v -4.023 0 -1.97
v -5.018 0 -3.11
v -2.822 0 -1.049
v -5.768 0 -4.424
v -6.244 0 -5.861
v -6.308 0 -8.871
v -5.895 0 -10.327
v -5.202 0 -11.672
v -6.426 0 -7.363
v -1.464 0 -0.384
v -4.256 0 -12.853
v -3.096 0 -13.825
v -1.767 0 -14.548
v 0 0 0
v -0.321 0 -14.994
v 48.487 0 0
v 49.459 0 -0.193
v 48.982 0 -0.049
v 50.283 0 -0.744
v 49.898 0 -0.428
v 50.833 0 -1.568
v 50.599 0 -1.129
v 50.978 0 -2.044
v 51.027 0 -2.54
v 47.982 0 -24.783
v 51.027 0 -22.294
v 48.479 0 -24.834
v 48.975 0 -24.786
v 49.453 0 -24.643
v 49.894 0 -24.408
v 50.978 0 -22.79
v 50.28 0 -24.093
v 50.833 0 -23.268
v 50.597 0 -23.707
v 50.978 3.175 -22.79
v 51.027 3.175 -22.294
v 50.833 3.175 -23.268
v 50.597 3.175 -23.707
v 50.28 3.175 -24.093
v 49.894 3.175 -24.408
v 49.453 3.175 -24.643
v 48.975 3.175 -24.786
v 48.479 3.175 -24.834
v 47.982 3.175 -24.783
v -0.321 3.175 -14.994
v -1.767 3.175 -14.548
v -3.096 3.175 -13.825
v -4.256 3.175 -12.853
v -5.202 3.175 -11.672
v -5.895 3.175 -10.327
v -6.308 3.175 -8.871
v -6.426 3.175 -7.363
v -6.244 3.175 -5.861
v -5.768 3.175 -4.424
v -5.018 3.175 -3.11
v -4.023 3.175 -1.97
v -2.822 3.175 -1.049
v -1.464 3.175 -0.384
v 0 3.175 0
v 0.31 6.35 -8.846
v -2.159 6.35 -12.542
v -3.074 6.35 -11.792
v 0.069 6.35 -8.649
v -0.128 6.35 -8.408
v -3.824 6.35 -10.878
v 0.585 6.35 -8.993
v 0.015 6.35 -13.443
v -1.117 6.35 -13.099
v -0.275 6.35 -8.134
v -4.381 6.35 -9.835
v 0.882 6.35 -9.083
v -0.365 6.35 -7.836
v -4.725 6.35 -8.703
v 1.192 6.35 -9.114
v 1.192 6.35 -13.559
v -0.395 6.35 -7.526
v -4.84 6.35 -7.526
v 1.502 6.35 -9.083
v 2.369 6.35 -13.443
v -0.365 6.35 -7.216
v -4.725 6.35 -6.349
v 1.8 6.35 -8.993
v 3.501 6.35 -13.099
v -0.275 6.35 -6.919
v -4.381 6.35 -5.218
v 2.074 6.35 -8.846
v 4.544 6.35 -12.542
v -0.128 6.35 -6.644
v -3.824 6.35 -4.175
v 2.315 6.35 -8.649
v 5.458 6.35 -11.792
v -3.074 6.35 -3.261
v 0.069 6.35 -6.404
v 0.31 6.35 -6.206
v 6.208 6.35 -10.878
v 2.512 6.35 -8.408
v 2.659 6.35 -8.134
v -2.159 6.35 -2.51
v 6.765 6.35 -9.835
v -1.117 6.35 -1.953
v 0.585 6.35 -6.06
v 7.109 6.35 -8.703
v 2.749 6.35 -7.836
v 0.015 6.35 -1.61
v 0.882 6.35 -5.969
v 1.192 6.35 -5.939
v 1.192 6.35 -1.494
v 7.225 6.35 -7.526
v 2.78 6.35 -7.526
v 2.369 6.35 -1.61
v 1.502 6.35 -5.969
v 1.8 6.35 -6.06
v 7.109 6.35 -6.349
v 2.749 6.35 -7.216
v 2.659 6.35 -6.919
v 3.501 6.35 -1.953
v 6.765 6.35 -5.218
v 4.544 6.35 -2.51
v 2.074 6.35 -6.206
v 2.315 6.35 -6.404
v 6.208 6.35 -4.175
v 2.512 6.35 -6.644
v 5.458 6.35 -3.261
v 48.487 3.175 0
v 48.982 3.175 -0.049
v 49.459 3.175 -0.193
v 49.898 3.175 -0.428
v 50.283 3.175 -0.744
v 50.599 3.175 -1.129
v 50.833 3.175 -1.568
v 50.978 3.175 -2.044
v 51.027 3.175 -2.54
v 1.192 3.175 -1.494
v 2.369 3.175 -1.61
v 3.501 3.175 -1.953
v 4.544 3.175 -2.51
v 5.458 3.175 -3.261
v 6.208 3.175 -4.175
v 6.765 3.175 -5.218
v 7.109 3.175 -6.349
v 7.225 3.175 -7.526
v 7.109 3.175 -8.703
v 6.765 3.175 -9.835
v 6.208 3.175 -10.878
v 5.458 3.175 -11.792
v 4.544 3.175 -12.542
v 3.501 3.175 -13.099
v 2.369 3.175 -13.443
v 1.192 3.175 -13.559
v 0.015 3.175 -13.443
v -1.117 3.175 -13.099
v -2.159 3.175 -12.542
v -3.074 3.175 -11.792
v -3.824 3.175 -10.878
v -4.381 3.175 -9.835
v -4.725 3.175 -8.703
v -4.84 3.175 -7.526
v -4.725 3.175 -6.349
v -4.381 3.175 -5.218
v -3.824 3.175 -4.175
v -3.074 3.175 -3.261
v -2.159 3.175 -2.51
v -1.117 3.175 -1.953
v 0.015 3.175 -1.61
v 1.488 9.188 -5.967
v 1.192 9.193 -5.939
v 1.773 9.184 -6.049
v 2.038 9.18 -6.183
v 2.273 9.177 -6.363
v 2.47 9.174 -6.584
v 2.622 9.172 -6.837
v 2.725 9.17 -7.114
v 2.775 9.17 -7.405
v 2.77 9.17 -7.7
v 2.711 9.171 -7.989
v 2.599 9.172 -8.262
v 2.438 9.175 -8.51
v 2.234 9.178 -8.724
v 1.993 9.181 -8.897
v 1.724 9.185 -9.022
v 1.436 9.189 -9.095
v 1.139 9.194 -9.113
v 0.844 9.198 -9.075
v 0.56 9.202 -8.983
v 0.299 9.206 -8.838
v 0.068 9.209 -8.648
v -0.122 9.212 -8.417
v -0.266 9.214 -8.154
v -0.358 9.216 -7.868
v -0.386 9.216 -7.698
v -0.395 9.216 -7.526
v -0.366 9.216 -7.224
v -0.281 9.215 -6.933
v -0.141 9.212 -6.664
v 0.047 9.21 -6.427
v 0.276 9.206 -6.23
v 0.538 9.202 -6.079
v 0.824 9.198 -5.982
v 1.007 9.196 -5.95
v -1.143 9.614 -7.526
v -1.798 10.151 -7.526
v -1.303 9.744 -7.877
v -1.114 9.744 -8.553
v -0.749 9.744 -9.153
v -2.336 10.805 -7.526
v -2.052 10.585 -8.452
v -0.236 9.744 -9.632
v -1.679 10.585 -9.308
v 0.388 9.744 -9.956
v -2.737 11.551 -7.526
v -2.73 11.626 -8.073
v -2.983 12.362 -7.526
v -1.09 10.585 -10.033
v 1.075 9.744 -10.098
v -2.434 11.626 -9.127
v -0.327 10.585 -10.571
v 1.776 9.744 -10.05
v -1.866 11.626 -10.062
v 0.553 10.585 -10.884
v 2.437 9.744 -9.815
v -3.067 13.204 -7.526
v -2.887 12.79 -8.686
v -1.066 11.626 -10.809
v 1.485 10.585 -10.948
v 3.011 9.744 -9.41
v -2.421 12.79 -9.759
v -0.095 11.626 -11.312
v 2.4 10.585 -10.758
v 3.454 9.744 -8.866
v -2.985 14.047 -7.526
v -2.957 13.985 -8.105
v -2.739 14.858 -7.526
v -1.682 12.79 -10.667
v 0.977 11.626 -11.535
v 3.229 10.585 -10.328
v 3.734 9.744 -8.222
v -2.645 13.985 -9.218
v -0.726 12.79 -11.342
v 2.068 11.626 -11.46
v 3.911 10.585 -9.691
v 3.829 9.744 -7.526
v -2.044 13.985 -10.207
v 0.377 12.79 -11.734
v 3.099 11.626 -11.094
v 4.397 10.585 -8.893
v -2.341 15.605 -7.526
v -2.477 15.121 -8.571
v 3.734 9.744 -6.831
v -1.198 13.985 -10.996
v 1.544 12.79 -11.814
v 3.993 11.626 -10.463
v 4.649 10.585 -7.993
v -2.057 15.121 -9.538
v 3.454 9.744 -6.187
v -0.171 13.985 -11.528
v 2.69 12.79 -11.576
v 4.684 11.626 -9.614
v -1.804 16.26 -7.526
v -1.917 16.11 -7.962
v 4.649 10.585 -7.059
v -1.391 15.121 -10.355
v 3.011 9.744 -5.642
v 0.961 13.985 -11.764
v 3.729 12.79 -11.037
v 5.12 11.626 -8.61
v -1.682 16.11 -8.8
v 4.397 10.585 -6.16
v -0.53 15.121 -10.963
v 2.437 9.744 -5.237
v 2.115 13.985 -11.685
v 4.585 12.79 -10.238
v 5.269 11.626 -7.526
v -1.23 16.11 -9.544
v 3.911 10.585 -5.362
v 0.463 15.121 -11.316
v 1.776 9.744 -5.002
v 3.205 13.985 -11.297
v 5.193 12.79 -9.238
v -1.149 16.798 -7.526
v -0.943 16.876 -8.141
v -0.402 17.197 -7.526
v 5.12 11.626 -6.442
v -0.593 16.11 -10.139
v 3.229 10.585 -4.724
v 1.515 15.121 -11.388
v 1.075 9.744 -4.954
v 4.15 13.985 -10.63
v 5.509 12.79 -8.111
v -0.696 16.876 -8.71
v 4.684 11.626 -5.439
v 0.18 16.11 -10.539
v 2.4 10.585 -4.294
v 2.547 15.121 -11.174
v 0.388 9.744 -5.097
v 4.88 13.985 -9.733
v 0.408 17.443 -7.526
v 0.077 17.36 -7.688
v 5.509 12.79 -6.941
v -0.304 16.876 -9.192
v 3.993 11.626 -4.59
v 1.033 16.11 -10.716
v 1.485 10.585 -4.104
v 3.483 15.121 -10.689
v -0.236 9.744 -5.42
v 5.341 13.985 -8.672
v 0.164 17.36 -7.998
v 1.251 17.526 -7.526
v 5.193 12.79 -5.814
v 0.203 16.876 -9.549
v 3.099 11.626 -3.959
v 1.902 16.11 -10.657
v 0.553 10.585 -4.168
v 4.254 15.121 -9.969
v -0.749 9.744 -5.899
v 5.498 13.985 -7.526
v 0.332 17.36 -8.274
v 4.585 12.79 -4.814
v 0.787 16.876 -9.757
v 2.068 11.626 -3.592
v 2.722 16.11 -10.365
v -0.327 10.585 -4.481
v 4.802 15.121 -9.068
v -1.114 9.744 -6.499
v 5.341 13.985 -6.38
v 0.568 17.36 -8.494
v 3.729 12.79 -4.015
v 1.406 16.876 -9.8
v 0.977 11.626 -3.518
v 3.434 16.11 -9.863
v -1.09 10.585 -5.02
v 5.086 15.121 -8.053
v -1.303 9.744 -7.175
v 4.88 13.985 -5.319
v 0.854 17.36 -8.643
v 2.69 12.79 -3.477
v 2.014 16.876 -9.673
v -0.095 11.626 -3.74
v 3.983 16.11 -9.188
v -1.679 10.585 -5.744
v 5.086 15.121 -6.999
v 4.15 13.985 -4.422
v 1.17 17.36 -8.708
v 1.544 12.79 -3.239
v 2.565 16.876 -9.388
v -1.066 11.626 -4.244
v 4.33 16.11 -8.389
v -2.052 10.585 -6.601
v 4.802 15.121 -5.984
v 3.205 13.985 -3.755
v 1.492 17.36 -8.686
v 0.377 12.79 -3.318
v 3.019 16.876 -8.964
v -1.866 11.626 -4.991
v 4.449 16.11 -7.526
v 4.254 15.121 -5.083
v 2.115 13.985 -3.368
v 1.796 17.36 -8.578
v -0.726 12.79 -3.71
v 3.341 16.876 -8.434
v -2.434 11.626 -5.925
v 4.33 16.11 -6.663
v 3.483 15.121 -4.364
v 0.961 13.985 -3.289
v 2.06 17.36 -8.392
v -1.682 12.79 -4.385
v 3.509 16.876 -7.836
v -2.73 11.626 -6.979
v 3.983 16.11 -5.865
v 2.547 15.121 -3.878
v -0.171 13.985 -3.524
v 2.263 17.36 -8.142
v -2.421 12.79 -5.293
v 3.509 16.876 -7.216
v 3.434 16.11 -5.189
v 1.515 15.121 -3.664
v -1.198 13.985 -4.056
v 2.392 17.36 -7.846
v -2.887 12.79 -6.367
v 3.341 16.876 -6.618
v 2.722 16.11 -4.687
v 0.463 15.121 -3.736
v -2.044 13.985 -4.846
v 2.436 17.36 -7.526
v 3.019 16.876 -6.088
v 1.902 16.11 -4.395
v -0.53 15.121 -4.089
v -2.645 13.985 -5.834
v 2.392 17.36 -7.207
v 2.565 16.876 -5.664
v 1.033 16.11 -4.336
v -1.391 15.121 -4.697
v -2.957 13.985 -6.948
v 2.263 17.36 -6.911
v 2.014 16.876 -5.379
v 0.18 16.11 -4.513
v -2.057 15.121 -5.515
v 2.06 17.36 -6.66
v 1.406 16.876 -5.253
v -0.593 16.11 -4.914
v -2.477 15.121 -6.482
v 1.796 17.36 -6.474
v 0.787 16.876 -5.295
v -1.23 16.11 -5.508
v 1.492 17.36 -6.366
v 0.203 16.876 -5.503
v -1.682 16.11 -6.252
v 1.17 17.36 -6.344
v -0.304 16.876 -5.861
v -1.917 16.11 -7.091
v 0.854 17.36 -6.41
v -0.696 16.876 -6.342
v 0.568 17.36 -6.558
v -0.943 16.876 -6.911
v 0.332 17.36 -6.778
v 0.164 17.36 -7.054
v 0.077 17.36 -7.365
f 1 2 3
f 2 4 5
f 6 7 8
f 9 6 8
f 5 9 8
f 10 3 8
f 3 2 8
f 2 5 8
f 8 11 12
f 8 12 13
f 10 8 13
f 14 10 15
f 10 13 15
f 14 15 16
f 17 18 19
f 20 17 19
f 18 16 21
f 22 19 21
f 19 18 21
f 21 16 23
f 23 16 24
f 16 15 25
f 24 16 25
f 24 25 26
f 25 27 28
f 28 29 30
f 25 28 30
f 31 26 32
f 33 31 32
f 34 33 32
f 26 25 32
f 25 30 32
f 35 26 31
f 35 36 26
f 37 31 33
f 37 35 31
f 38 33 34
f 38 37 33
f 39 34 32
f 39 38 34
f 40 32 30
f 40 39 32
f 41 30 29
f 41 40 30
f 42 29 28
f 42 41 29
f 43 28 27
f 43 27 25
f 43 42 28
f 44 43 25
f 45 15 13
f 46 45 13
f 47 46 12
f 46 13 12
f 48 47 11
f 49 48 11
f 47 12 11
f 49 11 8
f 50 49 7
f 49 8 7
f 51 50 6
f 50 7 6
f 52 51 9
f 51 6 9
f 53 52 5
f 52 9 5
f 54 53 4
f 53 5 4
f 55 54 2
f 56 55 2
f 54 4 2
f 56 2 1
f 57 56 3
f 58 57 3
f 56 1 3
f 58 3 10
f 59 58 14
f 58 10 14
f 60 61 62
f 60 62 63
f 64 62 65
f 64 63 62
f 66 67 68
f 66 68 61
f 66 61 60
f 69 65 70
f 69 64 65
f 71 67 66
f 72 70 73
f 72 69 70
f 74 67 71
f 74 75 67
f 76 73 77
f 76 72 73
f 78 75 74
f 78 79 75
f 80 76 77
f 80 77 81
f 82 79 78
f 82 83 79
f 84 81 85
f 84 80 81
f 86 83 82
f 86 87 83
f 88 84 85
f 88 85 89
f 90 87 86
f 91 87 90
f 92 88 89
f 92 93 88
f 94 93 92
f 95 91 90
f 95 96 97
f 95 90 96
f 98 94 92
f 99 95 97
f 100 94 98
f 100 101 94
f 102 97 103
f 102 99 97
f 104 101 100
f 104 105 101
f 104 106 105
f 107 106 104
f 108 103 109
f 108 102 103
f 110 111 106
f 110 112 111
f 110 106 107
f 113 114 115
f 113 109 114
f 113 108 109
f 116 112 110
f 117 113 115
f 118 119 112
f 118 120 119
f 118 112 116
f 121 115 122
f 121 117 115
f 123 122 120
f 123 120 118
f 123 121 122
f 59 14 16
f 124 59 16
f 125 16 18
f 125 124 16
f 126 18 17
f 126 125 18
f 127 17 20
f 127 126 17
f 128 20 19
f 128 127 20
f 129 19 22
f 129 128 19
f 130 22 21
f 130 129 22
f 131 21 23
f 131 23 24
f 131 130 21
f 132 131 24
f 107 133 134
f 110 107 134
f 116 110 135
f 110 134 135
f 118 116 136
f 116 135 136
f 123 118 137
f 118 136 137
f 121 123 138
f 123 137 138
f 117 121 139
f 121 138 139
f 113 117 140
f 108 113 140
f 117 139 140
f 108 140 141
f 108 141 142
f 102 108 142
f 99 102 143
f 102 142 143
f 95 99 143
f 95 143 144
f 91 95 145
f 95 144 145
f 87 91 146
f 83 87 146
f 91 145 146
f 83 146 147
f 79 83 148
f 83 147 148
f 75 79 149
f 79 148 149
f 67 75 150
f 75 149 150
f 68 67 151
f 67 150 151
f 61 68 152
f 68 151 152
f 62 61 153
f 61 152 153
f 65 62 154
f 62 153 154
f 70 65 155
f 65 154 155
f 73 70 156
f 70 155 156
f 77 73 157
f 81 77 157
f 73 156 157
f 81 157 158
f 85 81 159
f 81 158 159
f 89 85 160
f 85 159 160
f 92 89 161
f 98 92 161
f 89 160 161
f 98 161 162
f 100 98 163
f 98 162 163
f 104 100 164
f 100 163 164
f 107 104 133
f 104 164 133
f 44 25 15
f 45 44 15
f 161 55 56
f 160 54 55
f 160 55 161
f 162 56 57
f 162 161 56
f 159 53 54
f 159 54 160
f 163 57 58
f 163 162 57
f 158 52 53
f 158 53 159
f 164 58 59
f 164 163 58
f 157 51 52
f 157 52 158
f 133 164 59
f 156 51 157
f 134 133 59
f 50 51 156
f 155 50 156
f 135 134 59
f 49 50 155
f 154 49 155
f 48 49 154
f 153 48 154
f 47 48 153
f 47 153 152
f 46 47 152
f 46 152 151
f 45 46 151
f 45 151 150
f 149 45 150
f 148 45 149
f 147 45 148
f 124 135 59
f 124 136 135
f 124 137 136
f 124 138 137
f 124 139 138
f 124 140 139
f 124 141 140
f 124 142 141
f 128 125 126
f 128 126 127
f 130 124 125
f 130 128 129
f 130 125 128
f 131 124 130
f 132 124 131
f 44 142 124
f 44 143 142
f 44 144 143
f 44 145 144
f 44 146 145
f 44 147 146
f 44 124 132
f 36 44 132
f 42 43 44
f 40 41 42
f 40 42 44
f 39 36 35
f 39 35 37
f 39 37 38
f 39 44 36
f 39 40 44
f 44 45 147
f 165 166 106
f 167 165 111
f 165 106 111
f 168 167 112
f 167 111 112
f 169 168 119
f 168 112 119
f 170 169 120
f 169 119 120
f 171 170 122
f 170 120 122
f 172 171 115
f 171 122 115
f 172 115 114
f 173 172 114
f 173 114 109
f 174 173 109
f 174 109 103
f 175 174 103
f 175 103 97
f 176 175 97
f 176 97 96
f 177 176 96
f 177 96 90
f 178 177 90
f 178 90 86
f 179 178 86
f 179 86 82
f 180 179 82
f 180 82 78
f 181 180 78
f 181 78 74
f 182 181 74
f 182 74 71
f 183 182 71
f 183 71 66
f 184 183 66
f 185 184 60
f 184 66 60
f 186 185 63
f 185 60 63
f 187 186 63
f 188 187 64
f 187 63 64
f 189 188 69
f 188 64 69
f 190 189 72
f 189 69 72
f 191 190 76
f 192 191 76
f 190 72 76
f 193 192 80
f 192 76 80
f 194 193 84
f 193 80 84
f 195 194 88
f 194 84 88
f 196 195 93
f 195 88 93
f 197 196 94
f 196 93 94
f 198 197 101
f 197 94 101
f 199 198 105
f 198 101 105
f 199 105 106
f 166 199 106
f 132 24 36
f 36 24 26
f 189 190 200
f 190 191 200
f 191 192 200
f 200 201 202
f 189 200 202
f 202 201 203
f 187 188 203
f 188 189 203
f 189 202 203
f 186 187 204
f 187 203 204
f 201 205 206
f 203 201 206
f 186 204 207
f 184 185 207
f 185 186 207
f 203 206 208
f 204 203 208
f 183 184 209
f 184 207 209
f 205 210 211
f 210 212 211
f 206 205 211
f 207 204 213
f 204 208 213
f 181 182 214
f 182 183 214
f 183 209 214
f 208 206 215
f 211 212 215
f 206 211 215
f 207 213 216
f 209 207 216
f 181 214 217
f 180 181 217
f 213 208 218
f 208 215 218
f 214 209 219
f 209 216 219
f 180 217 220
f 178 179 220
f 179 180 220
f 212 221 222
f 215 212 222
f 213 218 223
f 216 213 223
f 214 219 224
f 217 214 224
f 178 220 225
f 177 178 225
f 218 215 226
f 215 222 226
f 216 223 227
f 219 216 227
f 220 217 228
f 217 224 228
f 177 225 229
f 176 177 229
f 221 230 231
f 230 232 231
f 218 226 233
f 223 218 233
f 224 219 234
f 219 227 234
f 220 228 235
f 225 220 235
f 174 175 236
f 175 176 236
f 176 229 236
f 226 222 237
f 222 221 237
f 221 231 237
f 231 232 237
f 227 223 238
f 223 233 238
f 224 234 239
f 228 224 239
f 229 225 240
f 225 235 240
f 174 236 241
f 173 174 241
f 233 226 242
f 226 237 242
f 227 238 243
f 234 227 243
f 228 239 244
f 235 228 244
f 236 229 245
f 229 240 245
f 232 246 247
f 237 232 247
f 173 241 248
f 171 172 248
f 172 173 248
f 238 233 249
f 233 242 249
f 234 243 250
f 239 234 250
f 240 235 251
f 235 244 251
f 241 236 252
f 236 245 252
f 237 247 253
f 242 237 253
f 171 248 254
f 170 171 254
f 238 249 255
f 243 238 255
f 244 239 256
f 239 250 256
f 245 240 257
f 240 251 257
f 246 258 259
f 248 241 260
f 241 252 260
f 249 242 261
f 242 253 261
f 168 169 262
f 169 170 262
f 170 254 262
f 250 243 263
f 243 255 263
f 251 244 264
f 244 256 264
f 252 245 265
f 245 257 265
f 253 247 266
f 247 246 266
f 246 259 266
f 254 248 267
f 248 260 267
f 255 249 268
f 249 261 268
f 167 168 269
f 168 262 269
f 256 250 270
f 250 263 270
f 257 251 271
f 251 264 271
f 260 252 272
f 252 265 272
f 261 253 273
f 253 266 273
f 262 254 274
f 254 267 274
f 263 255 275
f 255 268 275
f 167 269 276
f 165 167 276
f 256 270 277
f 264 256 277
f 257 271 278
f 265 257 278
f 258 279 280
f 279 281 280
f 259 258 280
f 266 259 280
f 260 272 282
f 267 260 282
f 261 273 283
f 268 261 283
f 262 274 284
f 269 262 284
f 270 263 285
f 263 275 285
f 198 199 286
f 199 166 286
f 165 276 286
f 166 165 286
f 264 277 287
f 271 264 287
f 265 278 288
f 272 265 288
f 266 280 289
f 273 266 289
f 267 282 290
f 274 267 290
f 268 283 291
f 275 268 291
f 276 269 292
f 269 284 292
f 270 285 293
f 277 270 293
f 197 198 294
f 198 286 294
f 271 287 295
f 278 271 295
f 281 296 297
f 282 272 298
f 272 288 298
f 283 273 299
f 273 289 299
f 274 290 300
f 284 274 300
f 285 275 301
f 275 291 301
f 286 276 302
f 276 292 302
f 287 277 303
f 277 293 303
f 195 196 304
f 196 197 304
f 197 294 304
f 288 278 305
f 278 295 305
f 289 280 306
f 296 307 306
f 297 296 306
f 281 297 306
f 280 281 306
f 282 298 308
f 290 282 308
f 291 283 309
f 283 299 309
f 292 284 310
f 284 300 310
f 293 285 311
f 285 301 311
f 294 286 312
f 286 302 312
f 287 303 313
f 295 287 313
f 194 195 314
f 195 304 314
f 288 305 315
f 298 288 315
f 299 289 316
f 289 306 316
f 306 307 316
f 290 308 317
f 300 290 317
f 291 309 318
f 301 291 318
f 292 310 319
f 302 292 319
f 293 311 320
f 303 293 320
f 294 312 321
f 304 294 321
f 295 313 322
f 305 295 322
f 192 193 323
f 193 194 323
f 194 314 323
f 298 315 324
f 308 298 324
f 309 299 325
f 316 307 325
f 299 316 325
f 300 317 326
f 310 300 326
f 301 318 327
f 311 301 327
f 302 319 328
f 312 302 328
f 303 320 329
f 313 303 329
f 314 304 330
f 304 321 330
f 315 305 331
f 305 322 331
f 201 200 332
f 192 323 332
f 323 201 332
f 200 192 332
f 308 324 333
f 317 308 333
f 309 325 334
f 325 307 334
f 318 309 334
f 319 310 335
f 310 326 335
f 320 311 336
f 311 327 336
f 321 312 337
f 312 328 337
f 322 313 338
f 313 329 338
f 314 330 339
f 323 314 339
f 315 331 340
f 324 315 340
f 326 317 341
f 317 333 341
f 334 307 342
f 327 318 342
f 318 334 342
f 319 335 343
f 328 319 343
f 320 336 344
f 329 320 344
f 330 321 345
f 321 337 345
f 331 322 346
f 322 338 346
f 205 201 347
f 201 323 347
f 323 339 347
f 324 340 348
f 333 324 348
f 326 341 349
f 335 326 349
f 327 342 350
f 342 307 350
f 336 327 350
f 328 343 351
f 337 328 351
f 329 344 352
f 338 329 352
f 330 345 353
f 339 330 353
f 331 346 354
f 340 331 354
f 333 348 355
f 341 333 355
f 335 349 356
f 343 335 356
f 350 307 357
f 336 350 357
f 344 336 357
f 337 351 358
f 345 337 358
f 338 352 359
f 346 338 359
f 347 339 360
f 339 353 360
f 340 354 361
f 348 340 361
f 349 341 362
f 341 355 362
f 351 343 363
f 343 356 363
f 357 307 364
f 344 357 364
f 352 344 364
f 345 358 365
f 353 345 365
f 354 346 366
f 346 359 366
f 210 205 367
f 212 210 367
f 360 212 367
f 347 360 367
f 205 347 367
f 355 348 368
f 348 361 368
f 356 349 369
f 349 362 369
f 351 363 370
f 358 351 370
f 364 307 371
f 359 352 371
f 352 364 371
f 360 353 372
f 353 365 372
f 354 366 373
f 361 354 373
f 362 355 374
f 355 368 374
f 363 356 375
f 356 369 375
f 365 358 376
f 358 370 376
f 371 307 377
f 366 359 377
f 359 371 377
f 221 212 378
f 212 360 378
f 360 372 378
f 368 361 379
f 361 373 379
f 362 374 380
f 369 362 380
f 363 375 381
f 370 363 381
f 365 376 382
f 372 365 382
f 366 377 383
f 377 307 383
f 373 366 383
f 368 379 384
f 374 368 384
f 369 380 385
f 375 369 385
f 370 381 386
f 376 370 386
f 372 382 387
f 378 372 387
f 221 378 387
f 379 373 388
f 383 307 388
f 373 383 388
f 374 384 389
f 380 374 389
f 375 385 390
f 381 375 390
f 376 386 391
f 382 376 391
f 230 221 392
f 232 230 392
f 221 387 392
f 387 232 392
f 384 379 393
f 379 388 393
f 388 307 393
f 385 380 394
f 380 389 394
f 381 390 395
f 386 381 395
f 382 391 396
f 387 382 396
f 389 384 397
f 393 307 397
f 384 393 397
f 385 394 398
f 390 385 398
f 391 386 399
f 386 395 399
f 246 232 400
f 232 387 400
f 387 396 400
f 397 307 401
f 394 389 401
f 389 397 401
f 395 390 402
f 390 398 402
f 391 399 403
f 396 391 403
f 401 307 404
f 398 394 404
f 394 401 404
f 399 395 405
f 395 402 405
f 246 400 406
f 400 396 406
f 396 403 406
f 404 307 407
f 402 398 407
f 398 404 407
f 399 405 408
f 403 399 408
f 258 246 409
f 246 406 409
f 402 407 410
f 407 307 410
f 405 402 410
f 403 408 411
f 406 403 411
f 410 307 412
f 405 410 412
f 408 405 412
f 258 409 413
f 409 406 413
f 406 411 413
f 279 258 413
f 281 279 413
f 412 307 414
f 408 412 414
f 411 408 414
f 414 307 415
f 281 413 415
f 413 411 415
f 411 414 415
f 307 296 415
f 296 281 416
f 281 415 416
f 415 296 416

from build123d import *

# Parameters (mm, degrees)
BOSS_EXTRUDE1_DEPTH = 3.175
SKETCH2_R           = 6.0325
BOSS_EXTRUDE2_DEPTH = 3.175
SKETCH3_R           = 1.5875
BOSS_EXTRUDE3_DEPTH = 3.175
FILLET1_R           = 2.54


with BuildPart() as part:
    # Sketch1 → Boss-Extrude1 (new body)
    with BuildSketch(Plane(origin=(0, 0, 0), x_dir=(1, 0, 0), z_dir=(0, 1, 0))):
        with BuildLine():
            Line((0, 0), (51.026830118, 0))
            Line((51.026830118, 0), (51.026830118, 25.4))
            Line((51.026830118, 25.4), (-0.321385748, 14.994382636))
            ThreePointArc((-0.321385748, 14.994382636), (-6.426220151, 7.362897615), (0, 0))
        make_face()
    extrude(amount=BOSS_EXTRUDE1_DEPTH)

    # Sketch2 → Boss-Extrude2 (add)
    with BuildSketch(Plane(origin=(0, 3.175, 0), x_dir=(1, 0, 0), z_dir=(0, 1, 0))):
        with Locations(Location((1.192030118, 7.526185235, 0), (0, 0, 270))):
            Circle(SKETCH2_R)
    extrude(amount=BOSS_EXTRUDE2_DEPTH)

    # Sketch3 → Boss-Extrude3 (add)
    with BuildSketch(Plane(origin=(0, 6.35, 0), x_dir=(1, 0, 0), z_dir=(0, 1, 0))):
        with Locations(Location((1.192030118, 7.526185235, 0), (0, 0, 270))):
            Circle(SKETCH3_R)
    extrude(amount=BOSS_EXTRUDE3_DEPTH)

    # Sketch5 → Revolve1 (revolve)
    with BuildSketch(Plane.XY.offset(-7.526185235)):
        with BuildLine():
            Line((1.250961313, 17.526), (1.250961313, 8.89))
            ThreePointArc((1.250961313, 8.89), (-3.067038687, 13.208), (1.250961313, 17.526))
        make_face()
    revolve(axis=Axis((1.250961313, 17.526, -7.526185235), (0, -1, 0)))

    # Fillet1
    fillet1_edges = [part.edges().sort_by_distance(p)[0] for p in [
        (51.026830118, 1.5875, 0),
        (51.026830118, 1.5875, -25.4),
    ]]
    fillet(fillet1_edges, radius=FILLET1_R)


solid = part.part
